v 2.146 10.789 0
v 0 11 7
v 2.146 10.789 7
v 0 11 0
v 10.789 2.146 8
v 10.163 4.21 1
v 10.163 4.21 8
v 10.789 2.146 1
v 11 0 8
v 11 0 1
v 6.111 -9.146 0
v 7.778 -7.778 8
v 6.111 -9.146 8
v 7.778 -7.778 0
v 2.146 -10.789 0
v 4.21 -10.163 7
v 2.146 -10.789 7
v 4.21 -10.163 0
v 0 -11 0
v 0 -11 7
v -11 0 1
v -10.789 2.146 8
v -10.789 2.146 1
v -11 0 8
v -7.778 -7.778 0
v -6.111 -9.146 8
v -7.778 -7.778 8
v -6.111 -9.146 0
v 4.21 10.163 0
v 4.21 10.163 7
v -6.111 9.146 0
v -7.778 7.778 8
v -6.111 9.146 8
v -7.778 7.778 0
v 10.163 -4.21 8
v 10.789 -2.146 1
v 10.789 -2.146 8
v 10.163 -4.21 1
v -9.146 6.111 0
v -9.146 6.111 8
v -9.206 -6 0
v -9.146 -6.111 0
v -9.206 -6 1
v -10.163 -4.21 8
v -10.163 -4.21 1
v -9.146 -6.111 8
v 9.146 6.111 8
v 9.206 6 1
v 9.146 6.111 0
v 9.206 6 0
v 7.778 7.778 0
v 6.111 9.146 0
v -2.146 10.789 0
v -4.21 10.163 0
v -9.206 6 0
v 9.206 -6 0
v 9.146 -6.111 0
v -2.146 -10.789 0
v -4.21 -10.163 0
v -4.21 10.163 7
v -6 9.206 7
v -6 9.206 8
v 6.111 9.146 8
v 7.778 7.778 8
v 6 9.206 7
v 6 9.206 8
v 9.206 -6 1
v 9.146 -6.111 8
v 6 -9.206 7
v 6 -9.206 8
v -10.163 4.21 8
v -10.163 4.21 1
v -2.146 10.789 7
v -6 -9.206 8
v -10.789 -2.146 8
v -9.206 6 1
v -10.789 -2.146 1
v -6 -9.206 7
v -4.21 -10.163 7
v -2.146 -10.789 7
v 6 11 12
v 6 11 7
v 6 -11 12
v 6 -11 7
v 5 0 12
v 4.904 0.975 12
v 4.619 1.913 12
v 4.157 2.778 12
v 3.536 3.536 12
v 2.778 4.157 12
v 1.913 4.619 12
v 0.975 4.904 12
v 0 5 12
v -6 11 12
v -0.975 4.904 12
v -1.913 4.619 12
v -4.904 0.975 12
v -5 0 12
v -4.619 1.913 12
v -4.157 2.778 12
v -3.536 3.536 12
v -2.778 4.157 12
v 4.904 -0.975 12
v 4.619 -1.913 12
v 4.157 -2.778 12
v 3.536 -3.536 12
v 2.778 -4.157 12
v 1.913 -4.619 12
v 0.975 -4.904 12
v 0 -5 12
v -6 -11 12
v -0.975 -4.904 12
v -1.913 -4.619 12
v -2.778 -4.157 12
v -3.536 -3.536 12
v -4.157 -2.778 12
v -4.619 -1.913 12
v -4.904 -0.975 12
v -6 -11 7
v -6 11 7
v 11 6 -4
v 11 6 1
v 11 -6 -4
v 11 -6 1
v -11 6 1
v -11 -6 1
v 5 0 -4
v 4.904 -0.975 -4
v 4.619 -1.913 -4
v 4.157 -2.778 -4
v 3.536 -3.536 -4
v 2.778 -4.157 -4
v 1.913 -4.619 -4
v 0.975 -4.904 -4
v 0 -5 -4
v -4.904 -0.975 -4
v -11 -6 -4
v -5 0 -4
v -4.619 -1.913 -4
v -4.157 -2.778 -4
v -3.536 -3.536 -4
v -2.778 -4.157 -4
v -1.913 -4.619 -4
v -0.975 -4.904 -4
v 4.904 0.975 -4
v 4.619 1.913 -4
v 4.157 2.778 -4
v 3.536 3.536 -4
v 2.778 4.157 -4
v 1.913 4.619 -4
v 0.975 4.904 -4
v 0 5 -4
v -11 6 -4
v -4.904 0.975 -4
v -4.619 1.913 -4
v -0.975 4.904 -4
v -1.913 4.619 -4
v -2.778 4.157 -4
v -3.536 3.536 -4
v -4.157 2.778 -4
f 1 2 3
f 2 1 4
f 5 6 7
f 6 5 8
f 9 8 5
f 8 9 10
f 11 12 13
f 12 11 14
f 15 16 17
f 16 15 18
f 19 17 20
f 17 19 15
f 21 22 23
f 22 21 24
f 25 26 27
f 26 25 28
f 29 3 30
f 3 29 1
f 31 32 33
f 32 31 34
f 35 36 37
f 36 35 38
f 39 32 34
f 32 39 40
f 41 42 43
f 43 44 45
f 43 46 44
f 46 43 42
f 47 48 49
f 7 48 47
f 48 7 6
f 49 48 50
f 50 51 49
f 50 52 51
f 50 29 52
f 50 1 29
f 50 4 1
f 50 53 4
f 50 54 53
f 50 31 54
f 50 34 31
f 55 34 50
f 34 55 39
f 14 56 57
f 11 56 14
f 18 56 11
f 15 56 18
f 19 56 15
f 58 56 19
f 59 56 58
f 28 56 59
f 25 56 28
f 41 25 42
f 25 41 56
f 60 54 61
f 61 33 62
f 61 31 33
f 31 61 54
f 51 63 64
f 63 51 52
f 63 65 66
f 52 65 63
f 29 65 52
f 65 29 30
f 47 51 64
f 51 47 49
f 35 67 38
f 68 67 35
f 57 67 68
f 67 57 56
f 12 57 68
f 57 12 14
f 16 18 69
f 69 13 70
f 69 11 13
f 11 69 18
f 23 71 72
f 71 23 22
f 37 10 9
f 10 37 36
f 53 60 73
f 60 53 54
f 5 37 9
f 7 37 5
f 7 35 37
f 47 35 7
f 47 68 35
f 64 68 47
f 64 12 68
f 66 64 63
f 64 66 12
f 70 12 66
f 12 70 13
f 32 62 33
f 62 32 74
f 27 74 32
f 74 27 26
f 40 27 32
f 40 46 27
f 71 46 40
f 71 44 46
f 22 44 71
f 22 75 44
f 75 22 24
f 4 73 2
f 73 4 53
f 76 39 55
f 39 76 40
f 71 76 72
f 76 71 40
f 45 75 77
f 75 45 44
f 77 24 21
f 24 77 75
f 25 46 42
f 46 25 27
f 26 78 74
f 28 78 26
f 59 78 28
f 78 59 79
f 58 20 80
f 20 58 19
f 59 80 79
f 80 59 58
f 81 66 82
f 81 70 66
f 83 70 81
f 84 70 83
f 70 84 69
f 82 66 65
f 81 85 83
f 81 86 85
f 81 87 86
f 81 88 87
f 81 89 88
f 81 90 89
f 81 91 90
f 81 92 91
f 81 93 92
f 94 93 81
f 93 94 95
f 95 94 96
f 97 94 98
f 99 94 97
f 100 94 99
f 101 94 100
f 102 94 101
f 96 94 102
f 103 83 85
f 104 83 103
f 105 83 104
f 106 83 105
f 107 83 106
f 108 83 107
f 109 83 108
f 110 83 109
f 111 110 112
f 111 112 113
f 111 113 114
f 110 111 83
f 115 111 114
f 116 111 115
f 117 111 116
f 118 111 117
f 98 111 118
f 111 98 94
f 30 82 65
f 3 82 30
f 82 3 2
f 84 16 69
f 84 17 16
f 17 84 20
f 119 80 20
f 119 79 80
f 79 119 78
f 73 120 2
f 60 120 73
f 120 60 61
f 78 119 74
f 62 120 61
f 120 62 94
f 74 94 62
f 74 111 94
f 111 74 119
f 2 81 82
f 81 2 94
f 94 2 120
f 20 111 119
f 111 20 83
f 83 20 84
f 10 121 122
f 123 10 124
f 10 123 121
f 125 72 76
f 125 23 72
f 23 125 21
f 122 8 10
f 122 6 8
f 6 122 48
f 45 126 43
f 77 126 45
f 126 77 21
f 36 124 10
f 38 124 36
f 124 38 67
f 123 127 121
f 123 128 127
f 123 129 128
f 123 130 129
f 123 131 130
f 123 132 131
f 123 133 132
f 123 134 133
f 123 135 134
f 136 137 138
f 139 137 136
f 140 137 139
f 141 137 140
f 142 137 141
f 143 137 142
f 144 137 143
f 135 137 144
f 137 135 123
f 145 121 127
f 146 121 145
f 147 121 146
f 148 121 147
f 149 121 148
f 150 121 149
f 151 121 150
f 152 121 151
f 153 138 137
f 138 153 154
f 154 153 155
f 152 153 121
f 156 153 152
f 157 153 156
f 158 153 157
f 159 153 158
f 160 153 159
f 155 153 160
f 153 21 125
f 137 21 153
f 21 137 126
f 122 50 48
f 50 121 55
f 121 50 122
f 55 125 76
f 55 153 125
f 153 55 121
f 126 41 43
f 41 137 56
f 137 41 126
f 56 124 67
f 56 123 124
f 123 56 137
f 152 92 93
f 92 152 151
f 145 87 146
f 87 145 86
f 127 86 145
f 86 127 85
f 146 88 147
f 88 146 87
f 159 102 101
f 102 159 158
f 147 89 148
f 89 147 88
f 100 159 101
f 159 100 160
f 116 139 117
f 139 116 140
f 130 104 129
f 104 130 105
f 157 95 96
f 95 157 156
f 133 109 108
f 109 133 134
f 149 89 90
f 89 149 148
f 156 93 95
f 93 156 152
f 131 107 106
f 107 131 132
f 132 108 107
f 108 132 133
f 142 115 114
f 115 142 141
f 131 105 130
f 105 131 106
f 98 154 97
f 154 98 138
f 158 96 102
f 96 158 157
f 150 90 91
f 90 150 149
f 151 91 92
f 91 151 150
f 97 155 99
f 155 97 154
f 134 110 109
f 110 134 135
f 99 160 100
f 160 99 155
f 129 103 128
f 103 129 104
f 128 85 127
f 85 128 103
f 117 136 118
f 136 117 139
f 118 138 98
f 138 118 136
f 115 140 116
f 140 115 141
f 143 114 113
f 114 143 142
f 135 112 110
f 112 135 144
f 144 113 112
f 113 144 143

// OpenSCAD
$fn = 32;

// ----------------------------------------------------------------------
// Oldham coupling disc: 22 x 16 mm
// ----------------------------------------------------------------------

// --- parameters (mm) ---
disc_d = 22;              // disc diameter
disc_t = 8;               // disc thickness
tongue_w = 12;            // tongue width
tongue_h = 4;             // tongue height
bore_d = 10;              // centre lightening bore

module disc() {
  cylinder(h = disc_t, d = disc_d);
  /* tongue on the top face, sunk 1 mm into the disc */
  translate([-tongue_w / 2, -disc_d / 2, disc_t - 1]) cube([tongue_w, disc_d, tongue_h + 1]);
  /* slot wall on the bottom face, 90 degrees turned */
  translate([-disc_d / 2, -tongue_w / 2, -tongue_h]) cube([disc_d, tongue_w, tongue_h + 1]);
}

difference() {
  disc();
  translate([0, 0, -tongue_h - 1]) cylinder(h = disc_t + 2 * tongue_h + 2, d = bore_d);
}
